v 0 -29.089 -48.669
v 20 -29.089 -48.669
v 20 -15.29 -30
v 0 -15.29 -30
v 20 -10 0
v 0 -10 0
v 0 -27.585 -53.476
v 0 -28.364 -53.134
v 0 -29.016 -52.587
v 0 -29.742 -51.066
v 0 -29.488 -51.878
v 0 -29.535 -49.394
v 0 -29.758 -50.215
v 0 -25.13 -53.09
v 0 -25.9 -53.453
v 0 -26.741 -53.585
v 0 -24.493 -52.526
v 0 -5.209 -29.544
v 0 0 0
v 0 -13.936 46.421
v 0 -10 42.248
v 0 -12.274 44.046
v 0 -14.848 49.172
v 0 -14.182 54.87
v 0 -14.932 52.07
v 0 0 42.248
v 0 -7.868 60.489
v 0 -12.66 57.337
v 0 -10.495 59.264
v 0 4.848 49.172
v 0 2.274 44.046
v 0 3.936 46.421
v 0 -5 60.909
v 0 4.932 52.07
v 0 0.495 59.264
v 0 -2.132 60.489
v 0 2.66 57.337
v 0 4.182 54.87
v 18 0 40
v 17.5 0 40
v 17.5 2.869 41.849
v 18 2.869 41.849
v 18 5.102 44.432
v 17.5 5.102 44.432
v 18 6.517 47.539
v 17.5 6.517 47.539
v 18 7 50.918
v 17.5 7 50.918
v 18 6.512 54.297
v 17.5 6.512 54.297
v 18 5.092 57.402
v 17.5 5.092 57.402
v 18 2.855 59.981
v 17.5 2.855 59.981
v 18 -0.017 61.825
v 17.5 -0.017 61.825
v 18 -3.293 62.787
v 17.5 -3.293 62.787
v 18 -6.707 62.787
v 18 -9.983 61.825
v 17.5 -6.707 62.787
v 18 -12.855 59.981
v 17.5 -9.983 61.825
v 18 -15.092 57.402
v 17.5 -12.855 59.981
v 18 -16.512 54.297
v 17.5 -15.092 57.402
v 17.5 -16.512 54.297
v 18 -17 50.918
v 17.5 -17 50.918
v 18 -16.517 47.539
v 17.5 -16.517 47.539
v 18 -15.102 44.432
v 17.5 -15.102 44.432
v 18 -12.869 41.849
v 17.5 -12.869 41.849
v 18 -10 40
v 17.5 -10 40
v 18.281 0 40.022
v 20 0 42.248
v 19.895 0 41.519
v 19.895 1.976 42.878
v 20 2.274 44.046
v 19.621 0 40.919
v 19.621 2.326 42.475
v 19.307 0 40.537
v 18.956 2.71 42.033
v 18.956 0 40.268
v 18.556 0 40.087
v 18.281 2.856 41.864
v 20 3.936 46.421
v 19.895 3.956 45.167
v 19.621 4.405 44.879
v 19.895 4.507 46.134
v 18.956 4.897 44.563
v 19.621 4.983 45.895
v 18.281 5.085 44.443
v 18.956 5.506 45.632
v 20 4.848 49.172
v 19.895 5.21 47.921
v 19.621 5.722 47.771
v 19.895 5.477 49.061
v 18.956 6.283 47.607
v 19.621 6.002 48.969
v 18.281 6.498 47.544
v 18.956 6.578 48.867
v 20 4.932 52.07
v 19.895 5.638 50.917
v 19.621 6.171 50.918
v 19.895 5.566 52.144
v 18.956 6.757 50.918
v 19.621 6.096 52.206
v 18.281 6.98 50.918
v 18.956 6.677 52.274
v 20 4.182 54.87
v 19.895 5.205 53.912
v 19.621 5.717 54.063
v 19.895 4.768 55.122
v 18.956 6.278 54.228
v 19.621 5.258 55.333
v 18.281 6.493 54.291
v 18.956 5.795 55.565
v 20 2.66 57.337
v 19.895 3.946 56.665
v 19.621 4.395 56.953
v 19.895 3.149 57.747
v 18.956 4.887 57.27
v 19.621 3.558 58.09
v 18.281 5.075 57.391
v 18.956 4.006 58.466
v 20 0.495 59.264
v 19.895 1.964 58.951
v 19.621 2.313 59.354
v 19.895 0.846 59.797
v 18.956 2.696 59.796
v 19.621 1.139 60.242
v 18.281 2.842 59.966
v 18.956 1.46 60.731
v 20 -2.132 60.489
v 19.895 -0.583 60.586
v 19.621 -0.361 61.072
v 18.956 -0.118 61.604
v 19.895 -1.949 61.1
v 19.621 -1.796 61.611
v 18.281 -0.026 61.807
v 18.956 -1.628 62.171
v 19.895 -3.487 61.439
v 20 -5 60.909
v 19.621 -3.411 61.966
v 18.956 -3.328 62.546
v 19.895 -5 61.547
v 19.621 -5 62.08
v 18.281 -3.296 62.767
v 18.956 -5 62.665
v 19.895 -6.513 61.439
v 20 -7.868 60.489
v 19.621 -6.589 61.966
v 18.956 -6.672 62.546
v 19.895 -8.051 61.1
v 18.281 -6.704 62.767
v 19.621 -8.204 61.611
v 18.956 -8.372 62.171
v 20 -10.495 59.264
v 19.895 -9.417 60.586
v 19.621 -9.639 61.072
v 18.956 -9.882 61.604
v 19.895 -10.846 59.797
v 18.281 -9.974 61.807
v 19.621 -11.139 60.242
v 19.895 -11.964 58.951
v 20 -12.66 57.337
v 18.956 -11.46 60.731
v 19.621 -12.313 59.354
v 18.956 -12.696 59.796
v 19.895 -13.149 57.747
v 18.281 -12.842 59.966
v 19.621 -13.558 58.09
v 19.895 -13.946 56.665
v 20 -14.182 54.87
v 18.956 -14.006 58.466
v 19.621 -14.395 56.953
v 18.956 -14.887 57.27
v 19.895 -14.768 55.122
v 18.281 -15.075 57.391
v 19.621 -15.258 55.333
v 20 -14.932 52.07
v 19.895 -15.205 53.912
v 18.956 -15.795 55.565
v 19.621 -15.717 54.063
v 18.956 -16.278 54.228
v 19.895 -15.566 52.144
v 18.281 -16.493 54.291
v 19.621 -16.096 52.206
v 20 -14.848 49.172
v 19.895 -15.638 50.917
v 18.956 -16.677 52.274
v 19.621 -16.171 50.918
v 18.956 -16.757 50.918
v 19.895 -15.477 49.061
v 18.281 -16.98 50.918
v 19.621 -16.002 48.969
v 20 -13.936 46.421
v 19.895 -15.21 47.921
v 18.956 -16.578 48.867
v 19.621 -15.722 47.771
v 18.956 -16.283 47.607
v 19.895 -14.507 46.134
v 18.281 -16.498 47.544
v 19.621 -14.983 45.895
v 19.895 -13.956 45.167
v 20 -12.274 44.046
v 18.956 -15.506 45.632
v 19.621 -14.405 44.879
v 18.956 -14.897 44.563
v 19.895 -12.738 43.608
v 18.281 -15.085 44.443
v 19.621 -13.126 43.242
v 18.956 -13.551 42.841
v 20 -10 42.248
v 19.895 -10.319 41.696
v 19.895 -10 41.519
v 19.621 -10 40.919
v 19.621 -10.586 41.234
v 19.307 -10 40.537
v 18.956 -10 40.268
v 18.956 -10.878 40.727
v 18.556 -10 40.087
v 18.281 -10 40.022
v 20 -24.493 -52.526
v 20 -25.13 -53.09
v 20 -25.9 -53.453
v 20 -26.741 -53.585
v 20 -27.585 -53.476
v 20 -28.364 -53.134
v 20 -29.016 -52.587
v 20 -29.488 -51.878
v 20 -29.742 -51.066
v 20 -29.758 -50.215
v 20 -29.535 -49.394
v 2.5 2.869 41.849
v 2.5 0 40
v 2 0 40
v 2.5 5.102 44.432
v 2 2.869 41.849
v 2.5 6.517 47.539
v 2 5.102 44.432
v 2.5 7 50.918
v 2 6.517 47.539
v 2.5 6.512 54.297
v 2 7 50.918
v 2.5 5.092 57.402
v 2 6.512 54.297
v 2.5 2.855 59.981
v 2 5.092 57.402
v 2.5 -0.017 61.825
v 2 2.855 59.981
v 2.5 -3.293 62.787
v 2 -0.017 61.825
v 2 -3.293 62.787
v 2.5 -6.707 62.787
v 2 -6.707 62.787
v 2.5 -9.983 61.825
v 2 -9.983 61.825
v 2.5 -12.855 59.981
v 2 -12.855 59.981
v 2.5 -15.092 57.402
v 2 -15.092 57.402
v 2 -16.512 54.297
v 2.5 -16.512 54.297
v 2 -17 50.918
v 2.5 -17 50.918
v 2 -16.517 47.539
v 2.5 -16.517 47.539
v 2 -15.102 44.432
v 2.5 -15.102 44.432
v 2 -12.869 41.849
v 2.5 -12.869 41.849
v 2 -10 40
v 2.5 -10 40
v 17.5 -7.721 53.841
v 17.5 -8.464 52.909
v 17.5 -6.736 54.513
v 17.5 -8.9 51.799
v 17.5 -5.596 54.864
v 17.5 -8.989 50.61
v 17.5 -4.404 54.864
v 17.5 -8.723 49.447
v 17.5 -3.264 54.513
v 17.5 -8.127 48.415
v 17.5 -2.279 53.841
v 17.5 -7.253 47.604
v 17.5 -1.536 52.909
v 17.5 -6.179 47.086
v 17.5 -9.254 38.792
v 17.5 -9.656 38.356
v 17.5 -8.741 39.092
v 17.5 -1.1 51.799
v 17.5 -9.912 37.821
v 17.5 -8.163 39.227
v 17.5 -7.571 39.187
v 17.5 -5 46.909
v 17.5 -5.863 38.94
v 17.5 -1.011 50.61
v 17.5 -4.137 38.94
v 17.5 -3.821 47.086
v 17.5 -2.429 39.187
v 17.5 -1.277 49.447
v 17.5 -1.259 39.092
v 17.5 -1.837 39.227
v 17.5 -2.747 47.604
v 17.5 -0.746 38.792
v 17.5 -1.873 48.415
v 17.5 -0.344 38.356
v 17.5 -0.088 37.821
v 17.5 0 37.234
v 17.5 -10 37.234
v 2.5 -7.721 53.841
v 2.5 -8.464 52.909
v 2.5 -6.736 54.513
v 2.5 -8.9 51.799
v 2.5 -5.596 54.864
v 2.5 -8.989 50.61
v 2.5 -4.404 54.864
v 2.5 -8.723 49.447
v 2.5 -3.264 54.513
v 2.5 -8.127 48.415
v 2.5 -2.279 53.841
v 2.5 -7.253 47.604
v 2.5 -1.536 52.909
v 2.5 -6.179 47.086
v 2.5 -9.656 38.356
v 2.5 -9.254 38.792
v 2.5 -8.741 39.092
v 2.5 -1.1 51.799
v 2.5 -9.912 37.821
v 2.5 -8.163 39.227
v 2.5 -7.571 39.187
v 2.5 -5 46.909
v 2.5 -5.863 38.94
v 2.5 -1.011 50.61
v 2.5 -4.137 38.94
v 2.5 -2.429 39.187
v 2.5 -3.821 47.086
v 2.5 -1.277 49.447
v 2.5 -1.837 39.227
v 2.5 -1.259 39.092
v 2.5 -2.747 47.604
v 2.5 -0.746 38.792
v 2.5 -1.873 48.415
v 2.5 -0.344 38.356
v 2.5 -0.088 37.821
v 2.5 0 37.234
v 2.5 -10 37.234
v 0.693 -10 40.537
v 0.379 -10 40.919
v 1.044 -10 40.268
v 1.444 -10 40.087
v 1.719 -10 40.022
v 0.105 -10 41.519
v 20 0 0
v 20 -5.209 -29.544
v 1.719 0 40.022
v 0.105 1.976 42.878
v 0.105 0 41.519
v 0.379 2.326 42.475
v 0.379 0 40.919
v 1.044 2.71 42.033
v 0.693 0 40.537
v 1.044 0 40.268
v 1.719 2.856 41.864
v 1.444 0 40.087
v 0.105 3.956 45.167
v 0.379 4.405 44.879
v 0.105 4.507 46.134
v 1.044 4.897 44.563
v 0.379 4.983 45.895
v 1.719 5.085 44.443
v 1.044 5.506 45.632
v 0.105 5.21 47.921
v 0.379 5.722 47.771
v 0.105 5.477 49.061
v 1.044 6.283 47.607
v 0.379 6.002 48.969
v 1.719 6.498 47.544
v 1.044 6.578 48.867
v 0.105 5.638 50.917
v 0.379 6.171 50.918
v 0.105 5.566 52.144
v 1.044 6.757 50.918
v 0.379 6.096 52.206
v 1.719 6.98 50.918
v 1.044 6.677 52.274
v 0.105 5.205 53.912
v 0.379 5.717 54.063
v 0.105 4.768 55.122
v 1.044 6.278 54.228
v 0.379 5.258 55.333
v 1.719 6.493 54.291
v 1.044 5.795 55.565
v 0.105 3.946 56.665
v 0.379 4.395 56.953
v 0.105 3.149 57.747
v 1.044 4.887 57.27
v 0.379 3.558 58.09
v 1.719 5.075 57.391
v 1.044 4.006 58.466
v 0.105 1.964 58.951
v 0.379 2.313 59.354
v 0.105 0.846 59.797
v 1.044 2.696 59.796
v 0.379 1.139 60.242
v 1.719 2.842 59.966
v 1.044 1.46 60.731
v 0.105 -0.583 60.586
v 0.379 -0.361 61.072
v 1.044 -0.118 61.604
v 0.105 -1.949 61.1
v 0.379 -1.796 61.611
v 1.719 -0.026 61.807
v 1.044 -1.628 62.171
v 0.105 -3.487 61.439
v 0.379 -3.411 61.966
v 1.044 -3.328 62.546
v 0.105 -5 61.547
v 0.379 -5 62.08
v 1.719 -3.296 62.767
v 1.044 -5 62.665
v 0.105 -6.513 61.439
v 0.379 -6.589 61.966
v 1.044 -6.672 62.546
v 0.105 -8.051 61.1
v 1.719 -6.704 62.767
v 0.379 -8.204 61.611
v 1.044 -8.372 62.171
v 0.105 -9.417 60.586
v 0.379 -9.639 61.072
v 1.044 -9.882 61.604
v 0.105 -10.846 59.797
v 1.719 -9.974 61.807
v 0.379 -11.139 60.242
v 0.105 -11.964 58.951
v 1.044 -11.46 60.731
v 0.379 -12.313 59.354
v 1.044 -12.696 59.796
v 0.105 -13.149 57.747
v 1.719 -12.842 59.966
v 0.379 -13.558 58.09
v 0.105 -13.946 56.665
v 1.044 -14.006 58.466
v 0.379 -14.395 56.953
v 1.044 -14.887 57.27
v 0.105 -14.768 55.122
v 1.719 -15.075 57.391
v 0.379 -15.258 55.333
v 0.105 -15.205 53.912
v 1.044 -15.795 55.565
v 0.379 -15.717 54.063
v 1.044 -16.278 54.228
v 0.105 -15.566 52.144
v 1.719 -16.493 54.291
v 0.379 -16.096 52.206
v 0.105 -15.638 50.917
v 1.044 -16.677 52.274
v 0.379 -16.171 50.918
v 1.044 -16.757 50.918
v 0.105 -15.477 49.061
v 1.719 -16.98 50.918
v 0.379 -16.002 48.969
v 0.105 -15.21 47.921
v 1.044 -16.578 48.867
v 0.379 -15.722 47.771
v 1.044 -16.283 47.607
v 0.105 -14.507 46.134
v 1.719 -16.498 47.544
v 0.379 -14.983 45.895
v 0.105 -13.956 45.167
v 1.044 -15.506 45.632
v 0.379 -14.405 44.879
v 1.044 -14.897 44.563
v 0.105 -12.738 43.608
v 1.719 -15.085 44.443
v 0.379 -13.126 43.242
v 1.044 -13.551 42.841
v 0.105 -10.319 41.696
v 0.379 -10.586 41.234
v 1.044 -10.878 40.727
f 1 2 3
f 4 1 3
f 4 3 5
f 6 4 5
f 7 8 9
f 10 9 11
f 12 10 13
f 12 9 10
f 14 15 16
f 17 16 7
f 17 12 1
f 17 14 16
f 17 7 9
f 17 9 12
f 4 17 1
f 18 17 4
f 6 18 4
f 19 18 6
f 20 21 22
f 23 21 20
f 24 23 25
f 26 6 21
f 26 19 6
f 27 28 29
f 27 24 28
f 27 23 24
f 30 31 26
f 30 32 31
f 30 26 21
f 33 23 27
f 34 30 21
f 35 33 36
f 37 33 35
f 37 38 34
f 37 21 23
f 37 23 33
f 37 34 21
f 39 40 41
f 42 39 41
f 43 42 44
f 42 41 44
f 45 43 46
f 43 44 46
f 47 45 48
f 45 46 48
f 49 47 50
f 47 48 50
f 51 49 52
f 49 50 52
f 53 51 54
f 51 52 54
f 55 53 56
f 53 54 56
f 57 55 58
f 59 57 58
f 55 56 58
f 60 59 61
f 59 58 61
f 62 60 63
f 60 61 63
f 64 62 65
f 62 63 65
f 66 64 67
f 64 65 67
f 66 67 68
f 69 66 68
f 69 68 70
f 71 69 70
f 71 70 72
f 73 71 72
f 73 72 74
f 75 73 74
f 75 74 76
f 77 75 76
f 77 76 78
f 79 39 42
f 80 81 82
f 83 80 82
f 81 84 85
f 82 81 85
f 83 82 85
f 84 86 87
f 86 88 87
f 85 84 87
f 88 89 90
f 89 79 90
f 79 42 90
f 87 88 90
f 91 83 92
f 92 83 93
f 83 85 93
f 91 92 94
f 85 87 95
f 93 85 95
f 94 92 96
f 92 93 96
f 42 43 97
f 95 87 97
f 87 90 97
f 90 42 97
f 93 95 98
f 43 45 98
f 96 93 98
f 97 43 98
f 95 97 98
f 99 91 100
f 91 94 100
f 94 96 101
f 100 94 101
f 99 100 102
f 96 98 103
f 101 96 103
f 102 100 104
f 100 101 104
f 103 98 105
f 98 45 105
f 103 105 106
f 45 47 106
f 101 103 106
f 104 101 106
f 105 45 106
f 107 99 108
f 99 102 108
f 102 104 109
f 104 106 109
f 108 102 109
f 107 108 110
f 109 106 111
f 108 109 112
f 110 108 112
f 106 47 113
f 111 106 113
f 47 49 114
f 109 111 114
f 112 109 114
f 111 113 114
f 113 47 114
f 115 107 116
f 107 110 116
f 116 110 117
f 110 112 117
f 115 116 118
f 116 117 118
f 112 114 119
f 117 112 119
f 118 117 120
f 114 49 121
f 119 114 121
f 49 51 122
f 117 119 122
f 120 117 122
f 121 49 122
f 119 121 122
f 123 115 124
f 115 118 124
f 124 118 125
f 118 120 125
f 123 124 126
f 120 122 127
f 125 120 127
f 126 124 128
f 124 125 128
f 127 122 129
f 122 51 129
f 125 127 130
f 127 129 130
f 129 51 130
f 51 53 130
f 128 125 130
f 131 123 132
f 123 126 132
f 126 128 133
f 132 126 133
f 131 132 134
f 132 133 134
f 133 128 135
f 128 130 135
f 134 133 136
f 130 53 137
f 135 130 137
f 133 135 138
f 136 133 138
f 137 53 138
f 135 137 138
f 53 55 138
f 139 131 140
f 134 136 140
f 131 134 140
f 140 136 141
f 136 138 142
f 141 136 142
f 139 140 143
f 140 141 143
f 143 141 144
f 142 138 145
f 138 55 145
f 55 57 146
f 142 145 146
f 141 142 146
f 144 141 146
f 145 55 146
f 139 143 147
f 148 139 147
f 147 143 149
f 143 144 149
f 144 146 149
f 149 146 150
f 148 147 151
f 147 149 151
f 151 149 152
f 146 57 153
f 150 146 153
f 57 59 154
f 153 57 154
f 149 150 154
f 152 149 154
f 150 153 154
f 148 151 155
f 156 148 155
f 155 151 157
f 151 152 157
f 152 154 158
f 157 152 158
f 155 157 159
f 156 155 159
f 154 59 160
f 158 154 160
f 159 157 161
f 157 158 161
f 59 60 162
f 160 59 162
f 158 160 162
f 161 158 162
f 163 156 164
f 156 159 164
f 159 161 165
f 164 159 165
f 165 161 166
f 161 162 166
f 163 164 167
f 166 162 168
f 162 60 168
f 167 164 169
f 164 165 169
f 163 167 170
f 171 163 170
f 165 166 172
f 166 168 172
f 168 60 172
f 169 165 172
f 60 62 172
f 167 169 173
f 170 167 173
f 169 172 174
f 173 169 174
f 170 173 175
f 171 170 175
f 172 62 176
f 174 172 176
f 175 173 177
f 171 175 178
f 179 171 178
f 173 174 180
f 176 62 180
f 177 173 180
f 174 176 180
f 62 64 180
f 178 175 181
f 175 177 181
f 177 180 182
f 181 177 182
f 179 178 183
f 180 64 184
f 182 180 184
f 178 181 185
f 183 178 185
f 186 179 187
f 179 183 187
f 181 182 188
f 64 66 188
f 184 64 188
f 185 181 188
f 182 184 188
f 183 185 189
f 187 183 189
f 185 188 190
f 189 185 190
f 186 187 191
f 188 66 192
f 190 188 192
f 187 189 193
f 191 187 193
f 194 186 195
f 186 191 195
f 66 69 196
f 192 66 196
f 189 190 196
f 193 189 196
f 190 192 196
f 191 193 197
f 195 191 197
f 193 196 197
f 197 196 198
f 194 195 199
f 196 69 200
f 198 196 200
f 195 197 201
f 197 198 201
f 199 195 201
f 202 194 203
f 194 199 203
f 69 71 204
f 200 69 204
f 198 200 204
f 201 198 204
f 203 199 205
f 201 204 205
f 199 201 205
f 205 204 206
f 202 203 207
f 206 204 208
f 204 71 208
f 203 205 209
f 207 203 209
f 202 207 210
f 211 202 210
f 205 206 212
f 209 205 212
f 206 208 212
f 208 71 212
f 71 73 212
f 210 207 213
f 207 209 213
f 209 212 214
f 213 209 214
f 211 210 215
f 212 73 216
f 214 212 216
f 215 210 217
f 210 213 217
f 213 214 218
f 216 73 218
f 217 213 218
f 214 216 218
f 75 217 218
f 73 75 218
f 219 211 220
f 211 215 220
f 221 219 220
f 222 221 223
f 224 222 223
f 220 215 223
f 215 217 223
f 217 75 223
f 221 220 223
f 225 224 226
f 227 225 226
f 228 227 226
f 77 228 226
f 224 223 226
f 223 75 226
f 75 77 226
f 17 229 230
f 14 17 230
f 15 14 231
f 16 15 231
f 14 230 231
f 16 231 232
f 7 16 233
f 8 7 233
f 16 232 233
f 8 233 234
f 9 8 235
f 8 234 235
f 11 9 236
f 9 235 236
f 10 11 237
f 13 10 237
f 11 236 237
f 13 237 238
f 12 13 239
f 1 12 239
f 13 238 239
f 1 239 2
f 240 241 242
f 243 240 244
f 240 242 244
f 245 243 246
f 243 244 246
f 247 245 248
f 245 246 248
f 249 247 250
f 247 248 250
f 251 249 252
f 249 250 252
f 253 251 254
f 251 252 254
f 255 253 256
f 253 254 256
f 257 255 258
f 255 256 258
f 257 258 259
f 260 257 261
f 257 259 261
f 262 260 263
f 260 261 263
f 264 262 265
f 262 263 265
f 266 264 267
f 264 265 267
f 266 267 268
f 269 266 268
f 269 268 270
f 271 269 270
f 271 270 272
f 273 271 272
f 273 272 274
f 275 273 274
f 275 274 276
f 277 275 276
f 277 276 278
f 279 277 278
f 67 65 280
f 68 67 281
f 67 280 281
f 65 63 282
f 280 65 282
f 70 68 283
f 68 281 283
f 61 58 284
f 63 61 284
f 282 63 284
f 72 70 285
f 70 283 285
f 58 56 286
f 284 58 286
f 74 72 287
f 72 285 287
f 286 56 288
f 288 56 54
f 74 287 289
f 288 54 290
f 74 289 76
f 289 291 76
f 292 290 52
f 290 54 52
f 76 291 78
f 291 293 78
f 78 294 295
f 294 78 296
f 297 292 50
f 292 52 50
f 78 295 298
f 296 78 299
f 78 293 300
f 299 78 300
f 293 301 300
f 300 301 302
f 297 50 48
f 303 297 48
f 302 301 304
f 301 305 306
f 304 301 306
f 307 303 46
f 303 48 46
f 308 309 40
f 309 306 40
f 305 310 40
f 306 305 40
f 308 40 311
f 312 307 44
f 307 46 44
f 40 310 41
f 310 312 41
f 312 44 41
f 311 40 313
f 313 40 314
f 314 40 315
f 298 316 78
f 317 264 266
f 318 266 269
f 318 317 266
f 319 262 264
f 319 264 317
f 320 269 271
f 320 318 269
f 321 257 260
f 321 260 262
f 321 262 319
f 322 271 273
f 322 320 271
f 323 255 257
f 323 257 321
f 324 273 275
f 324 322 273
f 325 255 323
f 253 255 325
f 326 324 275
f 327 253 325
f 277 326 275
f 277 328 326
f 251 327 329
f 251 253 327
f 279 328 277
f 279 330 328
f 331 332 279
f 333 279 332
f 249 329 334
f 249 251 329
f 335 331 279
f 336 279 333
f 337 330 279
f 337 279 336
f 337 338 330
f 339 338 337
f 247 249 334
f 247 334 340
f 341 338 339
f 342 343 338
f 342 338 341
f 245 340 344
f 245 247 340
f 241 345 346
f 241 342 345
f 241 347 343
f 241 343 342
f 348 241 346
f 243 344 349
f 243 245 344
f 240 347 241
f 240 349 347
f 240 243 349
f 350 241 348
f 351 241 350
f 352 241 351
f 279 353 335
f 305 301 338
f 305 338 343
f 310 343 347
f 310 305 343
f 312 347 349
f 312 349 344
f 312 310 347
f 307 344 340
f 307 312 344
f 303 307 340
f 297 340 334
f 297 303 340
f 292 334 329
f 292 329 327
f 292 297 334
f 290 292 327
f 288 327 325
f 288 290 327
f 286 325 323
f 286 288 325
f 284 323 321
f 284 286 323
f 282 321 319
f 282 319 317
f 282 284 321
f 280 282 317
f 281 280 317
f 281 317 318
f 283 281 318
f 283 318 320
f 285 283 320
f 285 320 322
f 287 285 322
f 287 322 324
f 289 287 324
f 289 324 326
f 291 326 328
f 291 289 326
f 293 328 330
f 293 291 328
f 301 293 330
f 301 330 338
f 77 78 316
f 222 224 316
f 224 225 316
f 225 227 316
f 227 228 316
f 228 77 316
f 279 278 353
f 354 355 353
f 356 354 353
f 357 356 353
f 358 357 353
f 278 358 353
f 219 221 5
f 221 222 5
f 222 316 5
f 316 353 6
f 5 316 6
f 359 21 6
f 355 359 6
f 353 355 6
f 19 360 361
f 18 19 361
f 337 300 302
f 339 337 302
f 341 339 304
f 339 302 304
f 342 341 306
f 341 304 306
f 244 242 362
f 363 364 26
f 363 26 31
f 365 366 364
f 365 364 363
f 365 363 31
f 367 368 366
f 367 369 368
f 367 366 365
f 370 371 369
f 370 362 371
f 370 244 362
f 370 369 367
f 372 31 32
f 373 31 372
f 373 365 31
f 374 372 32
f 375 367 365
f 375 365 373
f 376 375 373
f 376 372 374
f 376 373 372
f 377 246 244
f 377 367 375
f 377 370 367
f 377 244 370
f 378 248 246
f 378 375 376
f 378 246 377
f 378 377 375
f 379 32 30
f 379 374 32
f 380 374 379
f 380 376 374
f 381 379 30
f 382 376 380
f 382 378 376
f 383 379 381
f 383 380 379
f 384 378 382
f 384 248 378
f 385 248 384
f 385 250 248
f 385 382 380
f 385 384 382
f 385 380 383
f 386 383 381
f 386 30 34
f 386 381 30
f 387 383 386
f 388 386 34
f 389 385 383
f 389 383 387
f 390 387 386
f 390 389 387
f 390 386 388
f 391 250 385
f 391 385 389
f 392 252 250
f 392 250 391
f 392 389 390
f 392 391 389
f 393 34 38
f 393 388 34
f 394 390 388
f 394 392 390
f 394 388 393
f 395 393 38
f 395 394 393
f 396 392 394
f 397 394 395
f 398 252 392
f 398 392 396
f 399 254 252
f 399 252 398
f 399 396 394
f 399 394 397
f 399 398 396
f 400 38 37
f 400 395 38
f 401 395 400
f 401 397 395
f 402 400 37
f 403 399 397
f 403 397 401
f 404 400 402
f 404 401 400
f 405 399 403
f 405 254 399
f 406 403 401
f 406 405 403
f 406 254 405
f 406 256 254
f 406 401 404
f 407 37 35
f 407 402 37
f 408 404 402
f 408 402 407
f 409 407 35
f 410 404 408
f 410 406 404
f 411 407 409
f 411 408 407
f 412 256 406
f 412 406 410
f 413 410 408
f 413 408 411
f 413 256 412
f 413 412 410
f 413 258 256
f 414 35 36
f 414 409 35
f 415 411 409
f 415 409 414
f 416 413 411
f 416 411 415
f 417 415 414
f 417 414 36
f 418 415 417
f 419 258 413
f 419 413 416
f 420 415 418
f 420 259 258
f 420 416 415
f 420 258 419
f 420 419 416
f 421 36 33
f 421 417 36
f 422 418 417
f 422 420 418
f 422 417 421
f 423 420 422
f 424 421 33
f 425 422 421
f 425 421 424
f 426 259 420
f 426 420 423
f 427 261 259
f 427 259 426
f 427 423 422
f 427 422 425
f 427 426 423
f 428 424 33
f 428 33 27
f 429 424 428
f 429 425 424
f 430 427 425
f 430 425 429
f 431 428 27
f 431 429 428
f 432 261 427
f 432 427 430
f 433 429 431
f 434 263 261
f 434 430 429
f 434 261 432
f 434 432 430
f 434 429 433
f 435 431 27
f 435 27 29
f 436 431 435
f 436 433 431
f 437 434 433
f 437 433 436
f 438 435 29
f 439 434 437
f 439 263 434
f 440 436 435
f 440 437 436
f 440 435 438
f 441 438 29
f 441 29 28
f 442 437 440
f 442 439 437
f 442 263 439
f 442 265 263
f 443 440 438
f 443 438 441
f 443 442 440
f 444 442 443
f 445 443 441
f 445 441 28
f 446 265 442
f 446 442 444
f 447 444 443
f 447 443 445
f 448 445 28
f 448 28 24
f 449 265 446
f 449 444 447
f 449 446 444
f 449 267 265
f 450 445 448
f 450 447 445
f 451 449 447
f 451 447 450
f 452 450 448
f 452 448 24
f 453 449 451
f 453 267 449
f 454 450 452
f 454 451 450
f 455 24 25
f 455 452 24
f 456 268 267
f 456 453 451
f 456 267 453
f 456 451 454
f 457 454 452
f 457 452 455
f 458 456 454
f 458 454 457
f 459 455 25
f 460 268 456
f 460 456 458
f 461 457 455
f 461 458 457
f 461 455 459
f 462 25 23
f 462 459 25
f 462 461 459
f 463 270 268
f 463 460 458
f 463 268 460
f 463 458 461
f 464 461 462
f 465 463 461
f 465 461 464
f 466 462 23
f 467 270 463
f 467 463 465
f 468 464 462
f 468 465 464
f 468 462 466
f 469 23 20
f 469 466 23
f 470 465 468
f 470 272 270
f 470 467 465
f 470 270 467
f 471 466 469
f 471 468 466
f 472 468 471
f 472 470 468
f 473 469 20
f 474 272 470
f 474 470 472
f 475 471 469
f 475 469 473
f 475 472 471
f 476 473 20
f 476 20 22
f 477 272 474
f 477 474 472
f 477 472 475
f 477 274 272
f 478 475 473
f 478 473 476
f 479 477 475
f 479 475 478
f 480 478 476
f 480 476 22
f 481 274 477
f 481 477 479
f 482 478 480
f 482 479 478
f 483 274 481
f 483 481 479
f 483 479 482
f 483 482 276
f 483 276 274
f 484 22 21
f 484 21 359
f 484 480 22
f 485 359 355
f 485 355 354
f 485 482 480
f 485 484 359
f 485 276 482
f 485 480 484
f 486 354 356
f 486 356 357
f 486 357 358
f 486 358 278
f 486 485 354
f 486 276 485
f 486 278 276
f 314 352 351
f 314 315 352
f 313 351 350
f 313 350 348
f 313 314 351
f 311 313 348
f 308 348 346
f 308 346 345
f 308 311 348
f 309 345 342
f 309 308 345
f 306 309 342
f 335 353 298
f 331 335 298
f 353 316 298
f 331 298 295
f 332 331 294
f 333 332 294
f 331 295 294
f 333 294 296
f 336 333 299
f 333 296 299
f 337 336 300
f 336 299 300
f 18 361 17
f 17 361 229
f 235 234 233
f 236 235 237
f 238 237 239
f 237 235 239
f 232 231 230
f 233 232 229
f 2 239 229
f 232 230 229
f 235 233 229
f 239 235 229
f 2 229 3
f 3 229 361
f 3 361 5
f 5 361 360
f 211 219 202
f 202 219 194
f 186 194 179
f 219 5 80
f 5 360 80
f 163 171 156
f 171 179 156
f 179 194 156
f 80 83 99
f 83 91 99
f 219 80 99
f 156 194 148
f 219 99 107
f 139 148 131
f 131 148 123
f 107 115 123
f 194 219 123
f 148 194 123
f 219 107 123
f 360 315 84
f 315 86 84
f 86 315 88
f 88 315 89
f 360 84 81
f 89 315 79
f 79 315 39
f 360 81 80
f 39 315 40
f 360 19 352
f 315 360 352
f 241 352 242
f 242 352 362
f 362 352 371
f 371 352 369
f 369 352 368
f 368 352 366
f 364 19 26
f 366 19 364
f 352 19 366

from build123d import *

# Parameters (mm, degrees)
BOSS_EXTRUDE1_DEPTH = 20
CUT_EXTRUDE1_START  = -2.5
SKETCH2_R           = 12
SKETCH2_R_2         = 4
CUT_EXTRUDE1_DEPTH  = 15
FILLET1_R           = 2
BOSS_EXTRUDE2_DEPTH = 20


with BuildPart() as part:
    # Sketch1 → Boss-Extrude1 (new body)
    with BuildSketch(Plane(origin=(0, 0, 0), x_dir=(0, 0, -1), z_dir=(1, 0, 0))):
        with BuildLine():
            Line((0, 0), (-40, 0))
            ThreePointArc((-40, 0), (-62.908712115, -5), (-40, -10))
            Line((-40, -10), (0, -10))
            Line((0, -10), (0, 0))
        make_face()
    extrude(amount=BOSS_EXTRUDE1_DEPTH)

    # Sketch2 → Cut-Extrude1 (cut)
    with BuildSketch(Plane(origin=(20, 0, 0), x_dir=(0, 0, -1), z_dir=(1, 0, 0)).offset(CUT_EXTRUDE1_START)):
        with Locations((-50.908712115, -5)):
            Circle(SKETCH2_R)
        with Locations((-50.908712115, -5)):
            Circle(SKETCH2_R_2, mode=Mode.SUBTRACT)
    extrude(amount=-CUT_EXTRUDE1_DEPTH, mode=Mode.SUBTRACT)

    # Fillet1
    fillet1_edges = [part.edges().sort_by_distance(p)[0] for p in [
        (0, -5, 62.908712115),
        (20, -5, 62.908712115),
        (10, -10, 40),
        (10, 0, 40),
    ]]
    fillet(fillet1_edges, radius=FILLET1_R)

    # Sketch3 → Boss-Extrude2 (add)
    with BuildSketch(Plane(origin=(20, 0, 0), x_dir=(0, 0, -1), z_dir=(1, 0, 0))):
        with BuildLine():
            Line((0, 0), (29.54423259, -5.20944533))
            Line((29.54423259, -5.20944533), (52.525565884, -24.493073621))
            ThreePointArc((52.525565884, -24.493073621), (52.883353103, -28.709461138), (48.668892888, -29.089277519))
            Line((48.668892888, -29.089277519), (30, -15.289809421))
            Line((30, -15.289809421), (0, -10))
            Line((0, -10), (0, 0))
        make_face()
    extrude(amount=-BOSS_EXTRUDE2_DEPTH)


solid = part.part
